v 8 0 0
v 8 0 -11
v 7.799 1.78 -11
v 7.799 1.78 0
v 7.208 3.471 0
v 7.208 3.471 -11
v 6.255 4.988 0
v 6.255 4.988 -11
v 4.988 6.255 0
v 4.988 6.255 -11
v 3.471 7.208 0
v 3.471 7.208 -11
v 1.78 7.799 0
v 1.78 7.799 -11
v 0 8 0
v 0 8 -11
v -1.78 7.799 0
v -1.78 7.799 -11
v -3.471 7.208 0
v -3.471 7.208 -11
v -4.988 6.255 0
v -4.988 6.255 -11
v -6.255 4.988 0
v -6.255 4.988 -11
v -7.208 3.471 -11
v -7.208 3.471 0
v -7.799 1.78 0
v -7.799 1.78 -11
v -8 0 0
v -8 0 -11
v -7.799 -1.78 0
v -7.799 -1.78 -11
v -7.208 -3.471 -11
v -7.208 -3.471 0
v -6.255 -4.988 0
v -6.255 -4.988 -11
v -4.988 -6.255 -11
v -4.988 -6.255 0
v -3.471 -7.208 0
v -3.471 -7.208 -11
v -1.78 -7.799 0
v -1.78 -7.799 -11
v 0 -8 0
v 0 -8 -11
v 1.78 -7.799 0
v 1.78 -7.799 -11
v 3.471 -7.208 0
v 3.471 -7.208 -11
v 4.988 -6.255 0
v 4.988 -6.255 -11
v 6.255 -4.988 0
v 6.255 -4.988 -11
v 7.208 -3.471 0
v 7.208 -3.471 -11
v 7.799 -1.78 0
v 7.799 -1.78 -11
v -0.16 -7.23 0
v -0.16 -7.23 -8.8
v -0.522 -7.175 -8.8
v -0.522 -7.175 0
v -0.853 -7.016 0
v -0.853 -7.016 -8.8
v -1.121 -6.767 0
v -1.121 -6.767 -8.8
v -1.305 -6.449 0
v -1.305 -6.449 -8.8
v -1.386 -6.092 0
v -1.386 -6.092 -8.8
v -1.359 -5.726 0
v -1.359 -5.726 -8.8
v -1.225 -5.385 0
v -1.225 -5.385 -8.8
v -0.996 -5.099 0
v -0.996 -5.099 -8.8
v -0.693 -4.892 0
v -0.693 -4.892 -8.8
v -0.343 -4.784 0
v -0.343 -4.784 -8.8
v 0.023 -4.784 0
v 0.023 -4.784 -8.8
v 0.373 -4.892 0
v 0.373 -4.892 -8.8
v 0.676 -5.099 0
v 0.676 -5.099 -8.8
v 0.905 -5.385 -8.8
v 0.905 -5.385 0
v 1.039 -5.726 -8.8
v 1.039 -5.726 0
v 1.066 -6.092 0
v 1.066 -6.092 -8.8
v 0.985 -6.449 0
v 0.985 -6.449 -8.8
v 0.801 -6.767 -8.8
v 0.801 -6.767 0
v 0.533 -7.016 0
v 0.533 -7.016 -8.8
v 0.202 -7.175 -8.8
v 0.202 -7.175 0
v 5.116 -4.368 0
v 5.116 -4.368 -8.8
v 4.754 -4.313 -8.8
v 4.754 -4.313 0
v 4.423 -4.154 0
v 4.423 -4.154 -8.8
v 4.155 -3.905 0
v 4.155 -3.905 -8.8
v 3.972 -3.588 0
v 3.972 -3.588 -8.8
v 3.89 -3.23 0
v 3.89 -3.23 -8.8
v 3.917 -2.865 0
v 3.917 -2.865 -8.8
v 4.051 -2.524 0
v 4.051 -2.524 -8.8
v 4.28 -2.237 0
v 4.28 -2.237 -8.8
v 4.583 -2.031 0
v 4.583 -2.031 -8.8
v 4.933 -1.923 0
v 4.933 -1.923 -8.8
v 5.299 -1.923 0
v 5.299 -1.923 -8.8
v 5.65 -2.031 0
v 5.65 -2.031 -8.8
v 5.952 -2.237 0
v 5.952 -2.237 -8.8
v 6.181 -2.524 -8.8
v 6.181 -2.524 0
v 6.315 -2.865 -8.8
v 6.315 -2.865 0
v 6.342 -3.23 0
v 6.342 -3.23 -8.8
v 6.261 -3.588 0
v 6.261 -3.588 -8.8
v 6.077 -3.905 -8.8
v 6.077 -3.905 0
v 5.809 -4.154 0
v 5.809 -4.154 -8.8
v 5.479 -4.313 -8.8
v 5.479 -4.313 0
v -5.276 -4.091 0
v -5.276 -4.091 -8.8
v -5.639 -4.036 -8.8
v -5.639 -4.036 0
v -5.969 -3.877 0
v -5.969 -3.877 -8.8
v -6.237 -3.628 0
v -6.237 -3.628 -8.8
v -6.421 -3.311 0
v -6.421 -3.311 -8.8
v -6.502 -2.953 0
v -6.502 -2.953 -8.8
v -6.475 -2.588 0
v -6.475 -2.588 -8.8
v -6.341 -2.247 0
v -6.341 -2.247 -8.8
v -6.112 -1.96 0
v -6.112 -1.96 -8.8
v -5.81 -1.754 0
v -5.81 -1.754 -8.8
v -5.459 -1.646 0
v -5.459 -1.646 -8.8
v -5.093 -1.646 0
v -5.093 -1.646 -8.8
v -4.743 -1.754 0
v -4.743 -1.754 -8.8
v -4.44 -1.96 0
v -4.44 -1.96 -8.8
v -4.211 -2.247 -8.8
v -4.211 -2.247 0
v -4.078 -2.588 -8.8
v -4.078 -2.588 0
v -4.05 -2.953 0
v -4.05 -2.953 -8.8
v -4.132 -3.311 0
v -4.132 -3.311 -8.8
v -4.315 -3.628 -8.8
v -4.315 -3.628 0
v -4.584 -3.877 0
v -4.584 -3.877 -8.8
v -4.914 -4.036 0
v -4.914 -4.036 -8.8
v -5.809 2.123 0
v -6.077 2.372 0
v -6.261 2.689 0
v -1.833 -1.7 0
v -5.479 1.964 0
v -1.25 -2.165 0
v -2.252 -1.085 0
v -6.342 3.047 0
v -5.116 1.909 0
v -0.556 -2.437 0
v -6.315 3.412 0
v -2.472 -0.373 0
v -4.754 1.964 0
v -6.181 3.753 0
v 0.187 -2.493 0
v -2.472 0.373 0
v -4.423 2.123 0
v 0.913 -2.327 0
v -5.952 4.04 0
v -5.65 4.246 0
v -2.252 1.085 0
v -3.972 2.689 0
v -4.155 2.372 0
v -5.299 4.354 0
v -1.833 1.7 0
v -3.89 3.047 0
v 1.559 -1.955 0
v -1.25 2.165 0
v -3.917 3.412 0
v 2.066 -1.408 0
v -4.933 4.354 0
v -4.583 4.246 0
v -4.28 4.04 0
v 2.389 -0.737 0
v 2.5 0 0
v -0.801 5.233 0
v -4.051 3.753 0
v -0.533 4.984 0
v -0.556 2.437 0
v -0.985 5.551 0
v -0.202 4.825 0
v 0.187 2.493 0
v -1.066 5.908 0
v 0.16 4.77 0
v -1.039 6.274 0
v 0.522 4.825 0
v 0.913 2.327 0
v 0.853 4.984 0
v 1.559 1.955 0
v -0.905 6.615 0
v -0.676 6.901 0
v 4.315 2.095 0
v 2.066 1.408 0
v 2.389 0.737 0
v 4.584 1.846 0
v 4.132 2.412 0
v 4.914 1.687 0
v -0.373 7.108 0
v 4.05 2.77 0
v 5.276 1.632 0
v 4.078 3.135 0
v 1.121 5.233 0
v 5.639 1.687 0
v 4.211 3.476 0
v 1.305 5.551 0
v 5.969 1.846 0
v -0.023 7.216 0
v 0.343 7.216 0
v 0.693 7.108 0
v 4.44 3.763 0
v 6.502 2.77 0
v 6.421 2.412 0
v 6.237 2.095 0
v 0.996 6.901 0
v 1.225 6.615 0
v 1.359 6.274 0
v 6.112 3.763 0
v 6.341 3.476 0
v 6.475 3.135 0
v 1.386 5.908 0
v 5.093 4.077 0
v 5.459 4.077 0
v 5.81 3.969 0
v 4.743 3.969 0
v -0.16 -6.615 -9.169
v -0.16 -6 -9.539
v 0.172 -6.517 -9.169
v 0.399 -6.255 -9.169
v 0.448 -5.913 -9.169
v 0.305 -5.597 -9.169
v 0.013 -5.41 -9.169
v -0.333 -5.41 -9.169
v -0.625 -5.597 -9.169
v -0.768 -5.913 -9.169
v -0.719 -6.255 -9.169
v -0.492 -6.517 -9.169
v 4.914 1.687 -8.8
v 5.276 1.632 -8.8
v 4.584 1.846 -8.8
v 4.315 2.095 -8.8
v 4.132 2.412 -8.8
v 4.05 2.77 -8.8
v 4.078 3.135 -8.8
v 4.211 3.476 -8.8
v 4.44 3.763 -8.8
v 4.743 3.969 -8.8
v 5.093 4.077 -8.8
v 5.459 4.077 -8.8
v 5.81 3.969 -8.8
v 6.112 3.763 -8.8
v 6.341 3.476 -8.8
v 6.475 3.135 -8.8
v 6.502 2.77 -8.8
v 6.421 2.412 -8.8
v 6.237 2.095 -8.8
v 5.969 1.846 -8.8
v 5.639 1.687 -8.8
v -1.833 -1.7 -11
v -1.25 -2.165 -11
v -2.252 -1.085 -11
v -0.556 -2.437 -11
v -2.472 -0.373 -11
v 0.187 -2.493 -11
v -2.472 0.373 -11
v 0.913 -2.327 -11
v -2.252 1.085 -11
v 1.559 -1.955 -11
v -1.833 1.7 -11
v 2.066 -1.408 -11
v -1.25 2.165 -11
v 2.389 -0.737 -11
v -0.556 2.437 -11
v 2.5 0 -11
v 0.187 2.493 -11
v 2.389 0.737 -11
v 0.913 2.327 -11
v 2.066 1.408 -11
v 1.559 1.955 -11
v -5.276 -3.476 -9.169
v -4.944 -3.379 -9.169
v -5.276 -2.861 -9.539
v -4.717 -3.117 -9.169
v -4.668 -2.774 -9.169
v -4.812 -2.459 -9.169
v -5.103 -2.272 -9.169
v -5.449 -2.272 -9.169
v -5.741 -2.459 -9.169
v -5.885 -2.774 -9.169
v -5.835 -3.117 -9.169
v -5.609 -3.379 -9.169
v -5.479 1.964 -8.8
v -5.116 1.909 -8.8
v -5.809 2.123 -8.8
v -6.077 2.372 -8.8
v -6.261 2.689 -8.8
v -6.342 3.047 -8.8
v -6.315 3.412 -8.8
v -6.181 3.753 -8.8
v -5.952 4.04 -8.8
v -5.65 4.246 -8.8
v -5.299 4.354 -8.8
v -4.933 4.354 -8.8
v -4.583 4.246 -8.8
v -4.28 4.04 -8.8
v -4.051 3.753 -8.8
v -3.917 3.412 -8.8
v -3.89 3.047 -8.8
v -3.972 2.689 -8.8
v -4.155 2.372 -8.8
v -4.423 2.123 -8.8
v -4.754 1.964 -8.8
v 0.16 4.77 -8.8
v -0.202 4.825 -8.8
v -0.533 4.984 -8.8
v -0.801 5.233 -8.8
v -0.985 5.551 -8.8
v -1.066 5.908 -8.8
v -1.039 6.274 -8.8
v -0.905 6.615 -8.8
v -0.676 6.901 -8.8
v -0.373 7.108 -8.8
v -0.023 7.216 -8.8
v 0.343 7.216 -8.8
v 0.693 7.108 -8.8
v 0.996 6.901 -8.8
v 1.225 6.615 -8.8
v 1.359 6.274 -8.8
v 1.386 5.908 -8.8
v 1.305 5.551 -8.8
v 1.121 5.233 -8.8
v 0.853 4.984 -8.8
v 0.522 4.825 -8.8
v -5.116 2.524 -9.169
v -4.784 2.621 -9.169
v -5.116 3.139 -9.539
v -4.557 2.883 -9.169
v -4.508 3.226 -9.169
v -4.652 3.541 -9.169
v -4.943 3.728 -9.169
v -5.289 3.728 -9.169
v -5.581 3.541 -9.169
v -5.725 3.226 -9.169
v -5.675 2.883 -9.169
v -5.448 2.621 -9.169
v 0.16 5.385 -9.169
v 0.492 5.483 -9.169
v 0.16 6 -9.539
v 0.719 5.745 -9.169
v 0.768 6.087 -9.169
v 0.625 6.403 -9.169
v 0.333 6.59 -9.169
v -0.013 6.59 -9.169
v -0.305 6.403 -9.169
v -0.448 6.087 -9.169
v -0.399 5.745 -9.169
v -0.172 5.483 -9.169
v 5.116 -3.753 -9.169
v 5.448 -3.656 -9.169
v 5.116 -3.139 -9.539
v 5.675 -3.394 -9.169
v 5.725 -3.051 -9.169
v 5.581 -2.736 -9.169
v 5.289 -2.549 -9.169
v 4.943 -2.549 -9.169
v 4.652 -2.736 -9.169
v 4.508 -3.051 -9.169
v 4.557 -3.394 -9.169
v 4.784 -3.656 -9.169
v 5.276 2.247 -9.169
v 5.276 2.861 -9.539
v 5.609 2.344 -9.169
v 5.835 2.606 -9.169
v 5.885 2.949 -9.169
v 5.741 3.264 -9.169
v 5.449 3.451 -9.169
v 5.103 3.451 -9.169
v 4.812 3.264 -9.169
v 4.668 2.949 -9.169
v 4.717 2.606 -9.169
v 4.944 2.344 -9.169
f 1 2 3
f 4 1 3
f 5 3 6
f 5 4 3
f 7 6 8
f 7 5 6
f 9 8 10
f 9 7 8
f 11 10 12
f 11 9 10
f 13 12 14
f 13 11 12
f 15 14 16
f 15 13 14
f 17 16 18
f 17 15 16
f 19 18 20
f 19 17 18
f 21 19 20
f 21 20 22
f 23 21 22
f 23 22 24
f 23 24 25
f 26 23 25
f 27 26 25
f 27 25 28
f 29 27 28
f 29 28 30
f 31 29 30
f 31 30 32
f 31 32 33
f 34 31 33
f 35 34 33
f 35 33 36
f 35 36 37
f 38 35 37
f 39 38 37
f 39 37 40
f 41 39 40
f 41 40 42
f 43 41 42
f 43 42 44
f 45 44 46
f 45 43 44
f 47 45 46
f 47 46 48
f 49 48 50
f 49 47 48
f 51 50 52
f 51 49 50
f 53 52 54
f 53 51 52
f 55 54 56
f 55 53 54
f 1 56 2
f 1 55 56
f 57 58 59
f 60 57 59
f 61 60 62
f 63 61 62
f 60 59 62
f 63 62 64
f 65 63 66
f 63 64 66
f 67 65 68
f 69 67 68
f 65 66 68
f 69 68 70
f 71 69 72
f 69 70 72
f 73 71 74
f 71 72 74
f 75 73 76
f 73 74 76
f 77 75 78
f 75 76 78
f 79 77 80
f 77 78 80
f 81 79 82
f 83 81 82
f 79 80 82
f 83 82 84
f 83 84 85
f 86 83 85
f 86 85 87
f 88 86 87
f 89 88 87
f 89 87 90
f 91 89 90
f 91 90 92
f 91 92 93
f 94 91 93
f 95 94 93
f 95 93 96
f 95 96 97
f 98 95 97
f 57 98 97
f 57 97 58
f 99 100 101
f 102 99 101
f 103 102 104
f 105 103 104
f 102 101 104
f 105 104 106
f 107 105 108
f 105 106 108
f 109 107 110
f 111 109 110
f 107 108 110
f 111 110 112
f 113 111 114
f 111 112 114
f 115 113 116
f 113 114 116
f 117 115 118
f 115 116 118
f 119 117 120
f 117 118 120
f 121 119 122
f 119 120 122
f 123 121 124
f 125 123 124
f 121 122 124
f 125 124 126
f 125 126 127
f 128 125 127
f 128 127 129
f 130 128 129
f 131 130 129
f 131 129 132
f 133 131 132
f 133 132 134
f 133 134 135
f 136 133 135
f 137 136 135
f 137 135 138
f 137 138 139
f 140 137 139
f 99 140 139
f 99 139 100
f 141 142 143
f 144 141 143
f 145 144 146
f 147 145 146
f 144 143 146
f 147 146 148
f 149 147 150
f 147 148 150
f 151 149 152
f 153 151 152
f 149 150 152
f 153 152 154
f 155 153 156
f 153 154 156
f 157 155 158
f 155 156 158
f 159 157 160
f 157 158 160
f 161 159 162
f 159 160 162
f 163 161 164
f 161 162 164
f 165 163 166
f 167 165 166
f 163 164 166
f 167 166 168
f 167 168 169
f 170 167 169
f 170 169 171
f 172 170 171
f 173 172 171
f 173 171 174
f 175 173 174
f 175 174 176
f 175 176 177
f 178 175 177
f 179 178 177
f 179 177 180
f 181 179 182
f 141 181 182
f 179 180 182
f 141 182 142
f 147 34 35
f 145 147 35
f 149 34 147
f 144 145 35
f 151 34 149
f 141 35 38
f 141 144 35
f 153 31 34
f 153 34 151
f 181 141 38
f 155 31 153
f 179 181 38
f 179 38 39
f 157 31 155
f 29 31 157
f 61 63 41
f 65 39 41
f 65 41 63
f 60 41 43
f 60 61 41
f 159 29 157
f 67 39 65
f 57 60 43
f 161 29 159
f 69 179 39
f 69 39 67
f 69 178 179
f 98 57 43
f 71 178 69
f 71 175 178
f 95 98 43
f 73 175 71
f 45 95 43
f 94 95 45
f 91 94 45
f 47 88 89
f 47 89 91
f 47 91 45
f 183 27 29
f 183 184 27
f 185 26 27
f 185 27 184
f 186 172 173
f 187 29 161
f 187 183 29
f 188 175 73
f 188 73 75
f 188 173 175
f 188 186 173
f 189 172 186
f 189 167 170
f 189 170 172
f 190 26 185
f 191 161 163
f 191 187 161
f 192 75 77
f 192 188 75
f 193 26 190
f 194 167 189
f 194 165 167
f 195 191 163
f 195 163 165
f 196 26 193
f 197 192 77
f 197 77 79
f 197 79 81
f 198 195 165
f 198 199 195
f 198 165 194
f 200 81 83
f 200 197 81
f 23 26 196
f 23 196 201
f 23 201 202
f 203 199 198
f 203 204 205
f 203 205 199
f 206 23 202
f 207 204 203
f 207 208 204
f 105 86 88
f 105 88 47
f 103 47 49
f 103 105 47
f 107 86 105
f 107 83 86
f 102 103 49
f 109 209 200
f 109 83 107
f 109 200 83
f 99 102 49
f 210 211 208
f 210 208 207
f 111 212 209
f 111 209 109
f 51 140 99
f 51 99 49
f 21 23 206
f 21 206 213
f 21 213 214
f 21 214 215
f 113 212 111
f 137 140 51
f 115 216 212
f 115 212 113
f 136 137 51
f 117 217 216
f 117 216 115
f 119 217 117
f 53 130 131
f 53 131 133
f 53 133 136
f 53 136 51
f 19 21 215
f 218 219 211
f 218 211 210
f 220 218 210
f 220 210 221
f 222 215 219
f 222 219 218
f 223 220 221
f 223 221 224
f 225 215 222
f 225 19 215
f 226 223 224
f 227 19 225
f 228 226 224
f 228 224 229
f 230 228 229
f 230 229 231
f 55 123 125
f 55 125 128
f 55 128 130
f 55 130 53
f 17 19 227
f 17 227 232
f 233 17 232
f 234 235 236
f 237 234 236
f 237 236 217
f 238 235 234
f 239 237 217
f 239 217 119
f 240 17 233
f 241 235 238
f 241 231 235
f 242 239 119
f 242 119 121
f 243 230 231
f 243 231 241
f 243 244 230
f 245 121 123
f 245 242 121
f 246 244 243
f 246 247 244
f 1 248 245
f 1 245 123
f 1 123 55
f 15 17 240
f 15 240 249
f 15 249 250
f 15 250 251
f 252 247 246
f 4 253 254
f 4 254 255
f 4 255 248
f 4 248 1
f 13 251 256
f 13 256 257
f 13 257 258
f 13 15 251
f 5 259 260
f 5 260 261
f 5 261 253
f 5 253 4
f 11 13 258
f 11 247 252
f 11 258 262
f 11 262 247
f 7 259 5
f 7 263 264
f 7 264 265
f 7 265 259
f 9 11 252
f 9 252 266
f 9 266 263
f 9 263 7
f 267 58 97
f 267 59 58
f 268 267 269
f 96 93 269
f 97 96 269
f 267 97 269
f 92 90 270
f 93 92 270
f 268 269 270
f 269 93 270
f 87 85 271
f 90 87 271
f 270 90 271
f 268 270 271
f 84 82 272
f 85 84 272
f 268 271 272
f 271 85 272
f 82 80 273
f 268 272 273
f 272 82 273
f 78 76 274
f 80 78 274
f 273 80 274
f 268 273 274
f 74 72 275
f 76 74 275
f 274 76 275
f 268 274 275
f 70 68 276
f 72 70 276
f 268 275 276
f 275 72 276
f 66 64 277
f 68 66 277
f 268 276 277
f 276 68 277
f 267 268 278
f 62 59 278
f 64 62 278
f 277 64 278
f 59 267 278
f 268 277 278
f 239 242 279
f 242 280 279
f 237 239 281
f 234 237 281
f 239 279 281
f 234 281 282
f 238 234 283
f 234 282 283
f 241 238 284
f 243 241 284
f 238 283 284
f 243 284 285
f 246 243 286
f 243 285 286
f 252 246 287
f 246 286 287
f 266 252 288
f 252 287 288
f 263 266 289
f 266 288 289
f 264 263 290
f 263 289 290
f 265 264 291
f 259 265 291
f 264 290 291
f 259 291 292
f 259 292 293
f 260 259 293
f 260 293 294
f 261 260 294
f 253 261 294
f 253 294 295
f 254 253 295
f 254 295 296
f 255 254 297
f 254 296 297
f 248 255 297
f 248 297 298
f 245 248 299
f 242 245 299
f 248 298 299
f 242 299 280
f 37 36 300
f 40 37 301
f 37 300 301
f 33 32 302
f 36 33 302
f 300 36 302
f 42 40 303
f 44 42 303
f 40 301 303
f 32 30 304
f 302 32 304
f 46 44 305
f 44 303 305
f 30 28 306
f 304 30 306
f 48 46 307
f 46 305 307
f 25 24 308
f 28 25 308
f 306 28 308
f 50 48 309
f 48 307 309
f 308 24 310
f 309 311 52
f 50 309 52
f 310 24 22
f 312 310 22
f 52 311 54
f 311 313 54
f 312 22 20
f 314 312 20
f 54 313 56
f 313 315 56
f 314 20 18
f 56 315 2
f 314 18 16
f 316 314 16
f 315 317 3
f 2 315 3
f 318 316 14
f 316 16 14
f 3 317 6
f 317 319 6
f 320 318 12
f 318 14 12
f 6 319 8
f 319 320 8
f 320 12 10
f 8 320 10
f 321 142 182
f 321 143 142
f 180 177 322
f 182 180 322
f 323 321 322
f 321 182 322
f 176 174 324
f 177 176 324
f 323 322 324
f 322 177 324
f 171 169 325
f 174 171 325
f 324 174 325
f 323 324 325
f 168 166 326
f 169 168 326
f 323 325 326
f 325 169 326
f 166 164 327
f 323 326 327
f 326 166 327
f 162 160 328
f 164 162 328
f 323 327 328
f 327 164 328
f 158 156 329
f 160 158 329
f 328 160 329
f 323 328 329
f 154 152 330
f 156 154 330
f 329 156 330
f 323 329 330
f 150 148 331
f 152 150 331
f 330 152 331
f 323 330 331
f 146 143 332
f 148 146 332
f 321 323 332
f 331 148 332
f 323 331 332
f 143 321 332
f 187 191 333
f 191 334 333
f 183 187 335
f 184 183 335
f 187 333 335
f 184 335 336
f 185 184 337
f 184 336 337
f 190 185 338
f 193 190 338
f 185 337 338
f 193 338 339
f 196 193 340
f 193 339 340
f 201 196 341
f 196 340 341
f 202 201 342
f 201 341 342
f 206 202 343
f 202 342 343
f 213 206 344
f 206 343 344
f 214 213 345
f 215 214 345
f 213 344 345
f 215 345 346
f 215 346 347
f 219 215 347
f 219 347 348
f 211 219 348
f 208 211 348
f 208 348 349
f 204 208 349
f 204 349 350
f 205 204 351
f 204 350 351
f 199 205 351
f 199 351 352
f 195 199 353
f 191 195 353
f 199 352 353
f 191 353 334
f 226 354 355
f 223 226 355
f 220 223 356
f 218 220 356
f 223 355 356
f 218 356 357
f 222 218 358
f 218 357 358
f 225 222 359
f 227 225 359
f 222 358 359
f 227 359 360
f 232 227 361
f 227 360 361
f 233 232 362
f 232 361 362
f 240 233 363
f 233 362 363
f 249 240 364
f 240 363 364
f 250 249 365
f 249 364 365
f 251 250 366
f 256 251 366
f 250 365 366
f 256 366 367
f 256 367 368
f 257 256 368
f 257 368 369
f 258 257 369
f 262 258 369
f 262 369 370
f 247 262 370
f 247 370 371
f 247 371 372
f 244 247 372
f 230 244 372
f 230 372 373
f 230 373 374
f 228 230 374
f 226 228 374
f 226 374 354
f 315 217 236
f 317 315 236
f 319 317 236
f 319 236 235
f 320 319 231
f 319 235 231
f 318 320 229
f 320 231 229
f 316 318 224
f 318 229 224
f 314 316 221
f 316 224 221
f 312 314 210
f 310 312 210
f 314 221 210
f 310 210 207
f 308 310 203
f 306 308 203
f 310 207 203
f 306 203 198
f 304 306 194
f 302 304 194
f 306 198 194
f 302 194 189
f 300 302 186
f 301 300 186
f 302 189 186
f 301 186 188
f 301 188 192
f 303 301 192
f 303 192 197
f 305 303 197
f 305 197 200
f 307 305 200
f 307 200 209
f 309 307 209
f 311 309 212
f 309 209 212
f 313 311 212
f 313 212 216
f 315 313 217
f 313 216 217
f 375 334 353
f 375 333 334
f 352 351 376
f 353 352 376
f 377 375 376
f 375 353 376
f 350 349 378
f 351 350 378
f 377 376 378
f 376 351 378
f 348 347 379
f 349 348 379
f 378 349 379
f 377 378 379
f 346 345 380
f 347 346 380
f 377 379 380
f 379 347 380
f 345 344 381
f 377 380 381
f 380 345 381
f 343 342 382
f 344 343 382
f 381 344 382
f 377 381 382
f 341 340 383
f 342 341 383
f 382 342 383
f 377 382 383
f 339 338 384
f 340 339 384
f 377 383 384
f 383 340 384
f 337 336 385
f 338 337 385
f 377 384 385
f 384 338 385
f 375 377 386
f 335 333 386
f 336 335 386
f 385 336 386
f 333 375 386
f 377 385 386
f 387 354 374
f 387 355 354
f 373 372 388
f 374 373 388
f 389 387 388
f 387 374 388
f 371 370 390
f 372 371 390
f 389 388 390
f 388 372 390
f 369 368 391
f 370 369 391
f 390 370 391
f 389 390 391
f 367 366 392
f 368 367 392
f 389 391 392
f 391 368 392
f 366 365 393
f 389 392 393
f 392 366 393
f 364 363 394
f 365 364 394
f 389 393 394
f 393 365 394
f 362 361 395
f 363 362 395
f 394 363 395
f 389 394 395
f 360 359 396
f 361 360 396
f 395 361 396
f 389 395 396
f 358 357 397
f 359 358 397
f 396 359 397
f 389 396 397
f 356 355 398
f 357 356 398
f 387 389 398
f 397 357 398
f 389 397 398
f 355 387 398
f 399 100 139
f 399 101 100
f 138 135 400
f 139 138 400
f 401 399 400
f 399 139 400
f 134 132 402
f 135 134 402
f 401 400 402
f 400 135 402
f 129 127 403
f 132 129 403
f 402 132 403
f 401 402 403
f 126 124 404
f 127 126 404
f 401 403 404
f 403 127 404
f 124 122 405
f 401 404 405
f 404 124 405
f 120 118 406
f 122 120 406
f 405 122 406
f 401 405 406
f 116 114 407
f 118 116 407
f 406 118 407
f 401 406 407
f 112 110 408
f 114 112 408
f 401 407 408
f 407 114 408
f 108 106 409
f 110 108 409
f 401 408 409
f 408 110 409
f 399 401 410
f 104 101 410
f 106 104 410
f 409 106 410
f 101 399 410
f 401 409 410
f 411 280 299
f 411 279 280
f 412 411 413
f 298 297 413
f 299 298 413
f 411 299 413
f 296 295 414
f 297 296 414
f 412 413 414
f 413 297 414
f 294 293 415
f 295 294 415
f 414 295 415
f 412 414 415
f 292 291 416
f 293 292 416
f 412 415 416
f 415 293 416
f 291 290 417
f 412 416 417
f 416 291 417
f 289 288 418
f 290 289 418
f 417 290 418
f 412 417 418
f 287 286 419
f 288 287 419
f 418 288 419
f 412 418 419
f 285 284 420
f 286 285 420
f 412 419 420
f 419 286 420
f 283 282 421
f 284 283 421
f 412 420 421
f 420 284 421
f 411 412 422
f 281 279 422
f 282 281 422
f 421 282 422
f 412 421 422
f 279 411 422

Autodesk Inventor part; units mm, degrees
ref_plane "YZ Plane" through (0, 0, 0) normal (1, 0, 0) x (0, 1, 0)
ref_plane "XZ Plane" through (0, 0, 0) normal (0, 1, 0) x (-1, 0, 0)
ref_plane "XY Plane" through (0, 0, 0) normal (0, 0, 1) x (1, 0, 0)
sketch "Esquisse1" plane through (0, 0, 0) normal (0, 0, 1) x (1, 0, 0)
  circle A0 centre (0, 0) radius 8
  circle A1 centre (0, 0) radius 2.5
  point P0 (0.1533, 6)
  point P1 (-5.1195, 3.1328)
  point P2 (-5.2728, -2.8672)
  point P3 (-0.1533, -6)
  point P4 (5.1195, -3.1328)
  point P5 (5.2728, 2.8672)
  dimension "d0" = 5
  dimension "d1" = 16
  dimension "d2" = 6
  dimension "d5" = 360
extrude "Extrusion1" add sketch "Esquisse1" against normal blind 11
sketch "Esquisse2" plane through (0, 0, 0) normal (0, 0, 1) x (1, 0, 0)
  circle A0 centre (0, 0) radius 8 projected
  point P0 (0.16, 6)
  point P1 (-5.1161, 3.1386)
  point P2 (-5.2762, -2.8614)
  point P3 (-0.16, -6)
  point P4 (5.1161, -3.1386)
  point P5 (5.2762, 2.8614)
  dimension "d9" = 6
  dimension "d12" = 360
hole "Perçage1" at (0.16, 6, 0) at (-5.1161, 3.1386, 0) at (-5.2762, -2.8614, 0) at (-0.16, -6, 0) at (5.1161, -3.1386, 0) at (5.2762, 2.8614, 0) direction (0, 0, -1) diameter 2.459 depth 8.8 tip angle 118 thread size "M3x0.5" class "6H" standard "ISO Metric profile"
properties part number "moyeux_expansible"
